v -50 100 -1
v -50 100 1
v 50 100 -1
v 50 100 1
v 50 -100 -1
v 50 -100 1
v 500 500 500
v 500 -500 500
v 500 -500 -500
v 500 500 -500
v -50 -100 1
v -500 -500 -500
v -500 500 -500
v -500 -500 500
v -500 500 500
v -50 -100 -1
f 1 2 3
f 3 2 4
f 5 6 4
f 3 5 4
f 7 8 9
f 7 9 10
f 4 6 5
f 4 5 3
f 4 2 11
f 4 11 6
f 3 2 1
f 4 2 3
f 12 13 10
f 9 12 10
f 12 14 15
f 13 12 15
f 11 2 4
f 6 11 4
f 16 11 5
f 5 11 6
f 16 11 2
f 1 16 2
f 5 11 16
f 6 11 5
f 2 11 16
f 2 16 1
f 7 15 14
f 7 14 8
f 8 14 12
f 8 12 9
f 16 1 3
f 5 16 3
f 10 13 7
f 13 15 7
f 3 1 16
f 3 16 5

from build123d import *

# Parameters (mm, degrees)
F0_W          = 100
F0_H          = 200
F1_DEPTH      = 1
F1_DEPTH_BACK = 1
F2_W          = 1000
F2_H          = 1000
F3_DEPTH      = 500
F3_DEPTH_BACK = 500


# Not quite as in the source:
# - a feature names something its author has since deleted; it is built from what else it names


with BuildPart() as f1:
    # F0 (on Top) → F1 (new body, two sides)
    with BuildSketch(Plane.XY) as f1_sk:
        Rectangle(F0_W, F0_H)
    extrude(amount=F1_DEPTH)
    extrude(f1_sk.sketch, amount=-F1_DEPTH_BACK)


with BuildPart() as f3:
    # F2 (on Top) → F3 (new body, two sides)
    with BuildSketch(Plane.XY) as f3_sk:
        Rectangle(F2_W, F2_H)
    extrude(amount=F3_DEPTH)
    extrude(f3_sk.sketch, amount=-F3_DEPTH_BACK)

    # F4: cut F1
    add(f1.part, mode=Mode.SUBTRACT)


solid = Compound([f1.part, f3.part])
